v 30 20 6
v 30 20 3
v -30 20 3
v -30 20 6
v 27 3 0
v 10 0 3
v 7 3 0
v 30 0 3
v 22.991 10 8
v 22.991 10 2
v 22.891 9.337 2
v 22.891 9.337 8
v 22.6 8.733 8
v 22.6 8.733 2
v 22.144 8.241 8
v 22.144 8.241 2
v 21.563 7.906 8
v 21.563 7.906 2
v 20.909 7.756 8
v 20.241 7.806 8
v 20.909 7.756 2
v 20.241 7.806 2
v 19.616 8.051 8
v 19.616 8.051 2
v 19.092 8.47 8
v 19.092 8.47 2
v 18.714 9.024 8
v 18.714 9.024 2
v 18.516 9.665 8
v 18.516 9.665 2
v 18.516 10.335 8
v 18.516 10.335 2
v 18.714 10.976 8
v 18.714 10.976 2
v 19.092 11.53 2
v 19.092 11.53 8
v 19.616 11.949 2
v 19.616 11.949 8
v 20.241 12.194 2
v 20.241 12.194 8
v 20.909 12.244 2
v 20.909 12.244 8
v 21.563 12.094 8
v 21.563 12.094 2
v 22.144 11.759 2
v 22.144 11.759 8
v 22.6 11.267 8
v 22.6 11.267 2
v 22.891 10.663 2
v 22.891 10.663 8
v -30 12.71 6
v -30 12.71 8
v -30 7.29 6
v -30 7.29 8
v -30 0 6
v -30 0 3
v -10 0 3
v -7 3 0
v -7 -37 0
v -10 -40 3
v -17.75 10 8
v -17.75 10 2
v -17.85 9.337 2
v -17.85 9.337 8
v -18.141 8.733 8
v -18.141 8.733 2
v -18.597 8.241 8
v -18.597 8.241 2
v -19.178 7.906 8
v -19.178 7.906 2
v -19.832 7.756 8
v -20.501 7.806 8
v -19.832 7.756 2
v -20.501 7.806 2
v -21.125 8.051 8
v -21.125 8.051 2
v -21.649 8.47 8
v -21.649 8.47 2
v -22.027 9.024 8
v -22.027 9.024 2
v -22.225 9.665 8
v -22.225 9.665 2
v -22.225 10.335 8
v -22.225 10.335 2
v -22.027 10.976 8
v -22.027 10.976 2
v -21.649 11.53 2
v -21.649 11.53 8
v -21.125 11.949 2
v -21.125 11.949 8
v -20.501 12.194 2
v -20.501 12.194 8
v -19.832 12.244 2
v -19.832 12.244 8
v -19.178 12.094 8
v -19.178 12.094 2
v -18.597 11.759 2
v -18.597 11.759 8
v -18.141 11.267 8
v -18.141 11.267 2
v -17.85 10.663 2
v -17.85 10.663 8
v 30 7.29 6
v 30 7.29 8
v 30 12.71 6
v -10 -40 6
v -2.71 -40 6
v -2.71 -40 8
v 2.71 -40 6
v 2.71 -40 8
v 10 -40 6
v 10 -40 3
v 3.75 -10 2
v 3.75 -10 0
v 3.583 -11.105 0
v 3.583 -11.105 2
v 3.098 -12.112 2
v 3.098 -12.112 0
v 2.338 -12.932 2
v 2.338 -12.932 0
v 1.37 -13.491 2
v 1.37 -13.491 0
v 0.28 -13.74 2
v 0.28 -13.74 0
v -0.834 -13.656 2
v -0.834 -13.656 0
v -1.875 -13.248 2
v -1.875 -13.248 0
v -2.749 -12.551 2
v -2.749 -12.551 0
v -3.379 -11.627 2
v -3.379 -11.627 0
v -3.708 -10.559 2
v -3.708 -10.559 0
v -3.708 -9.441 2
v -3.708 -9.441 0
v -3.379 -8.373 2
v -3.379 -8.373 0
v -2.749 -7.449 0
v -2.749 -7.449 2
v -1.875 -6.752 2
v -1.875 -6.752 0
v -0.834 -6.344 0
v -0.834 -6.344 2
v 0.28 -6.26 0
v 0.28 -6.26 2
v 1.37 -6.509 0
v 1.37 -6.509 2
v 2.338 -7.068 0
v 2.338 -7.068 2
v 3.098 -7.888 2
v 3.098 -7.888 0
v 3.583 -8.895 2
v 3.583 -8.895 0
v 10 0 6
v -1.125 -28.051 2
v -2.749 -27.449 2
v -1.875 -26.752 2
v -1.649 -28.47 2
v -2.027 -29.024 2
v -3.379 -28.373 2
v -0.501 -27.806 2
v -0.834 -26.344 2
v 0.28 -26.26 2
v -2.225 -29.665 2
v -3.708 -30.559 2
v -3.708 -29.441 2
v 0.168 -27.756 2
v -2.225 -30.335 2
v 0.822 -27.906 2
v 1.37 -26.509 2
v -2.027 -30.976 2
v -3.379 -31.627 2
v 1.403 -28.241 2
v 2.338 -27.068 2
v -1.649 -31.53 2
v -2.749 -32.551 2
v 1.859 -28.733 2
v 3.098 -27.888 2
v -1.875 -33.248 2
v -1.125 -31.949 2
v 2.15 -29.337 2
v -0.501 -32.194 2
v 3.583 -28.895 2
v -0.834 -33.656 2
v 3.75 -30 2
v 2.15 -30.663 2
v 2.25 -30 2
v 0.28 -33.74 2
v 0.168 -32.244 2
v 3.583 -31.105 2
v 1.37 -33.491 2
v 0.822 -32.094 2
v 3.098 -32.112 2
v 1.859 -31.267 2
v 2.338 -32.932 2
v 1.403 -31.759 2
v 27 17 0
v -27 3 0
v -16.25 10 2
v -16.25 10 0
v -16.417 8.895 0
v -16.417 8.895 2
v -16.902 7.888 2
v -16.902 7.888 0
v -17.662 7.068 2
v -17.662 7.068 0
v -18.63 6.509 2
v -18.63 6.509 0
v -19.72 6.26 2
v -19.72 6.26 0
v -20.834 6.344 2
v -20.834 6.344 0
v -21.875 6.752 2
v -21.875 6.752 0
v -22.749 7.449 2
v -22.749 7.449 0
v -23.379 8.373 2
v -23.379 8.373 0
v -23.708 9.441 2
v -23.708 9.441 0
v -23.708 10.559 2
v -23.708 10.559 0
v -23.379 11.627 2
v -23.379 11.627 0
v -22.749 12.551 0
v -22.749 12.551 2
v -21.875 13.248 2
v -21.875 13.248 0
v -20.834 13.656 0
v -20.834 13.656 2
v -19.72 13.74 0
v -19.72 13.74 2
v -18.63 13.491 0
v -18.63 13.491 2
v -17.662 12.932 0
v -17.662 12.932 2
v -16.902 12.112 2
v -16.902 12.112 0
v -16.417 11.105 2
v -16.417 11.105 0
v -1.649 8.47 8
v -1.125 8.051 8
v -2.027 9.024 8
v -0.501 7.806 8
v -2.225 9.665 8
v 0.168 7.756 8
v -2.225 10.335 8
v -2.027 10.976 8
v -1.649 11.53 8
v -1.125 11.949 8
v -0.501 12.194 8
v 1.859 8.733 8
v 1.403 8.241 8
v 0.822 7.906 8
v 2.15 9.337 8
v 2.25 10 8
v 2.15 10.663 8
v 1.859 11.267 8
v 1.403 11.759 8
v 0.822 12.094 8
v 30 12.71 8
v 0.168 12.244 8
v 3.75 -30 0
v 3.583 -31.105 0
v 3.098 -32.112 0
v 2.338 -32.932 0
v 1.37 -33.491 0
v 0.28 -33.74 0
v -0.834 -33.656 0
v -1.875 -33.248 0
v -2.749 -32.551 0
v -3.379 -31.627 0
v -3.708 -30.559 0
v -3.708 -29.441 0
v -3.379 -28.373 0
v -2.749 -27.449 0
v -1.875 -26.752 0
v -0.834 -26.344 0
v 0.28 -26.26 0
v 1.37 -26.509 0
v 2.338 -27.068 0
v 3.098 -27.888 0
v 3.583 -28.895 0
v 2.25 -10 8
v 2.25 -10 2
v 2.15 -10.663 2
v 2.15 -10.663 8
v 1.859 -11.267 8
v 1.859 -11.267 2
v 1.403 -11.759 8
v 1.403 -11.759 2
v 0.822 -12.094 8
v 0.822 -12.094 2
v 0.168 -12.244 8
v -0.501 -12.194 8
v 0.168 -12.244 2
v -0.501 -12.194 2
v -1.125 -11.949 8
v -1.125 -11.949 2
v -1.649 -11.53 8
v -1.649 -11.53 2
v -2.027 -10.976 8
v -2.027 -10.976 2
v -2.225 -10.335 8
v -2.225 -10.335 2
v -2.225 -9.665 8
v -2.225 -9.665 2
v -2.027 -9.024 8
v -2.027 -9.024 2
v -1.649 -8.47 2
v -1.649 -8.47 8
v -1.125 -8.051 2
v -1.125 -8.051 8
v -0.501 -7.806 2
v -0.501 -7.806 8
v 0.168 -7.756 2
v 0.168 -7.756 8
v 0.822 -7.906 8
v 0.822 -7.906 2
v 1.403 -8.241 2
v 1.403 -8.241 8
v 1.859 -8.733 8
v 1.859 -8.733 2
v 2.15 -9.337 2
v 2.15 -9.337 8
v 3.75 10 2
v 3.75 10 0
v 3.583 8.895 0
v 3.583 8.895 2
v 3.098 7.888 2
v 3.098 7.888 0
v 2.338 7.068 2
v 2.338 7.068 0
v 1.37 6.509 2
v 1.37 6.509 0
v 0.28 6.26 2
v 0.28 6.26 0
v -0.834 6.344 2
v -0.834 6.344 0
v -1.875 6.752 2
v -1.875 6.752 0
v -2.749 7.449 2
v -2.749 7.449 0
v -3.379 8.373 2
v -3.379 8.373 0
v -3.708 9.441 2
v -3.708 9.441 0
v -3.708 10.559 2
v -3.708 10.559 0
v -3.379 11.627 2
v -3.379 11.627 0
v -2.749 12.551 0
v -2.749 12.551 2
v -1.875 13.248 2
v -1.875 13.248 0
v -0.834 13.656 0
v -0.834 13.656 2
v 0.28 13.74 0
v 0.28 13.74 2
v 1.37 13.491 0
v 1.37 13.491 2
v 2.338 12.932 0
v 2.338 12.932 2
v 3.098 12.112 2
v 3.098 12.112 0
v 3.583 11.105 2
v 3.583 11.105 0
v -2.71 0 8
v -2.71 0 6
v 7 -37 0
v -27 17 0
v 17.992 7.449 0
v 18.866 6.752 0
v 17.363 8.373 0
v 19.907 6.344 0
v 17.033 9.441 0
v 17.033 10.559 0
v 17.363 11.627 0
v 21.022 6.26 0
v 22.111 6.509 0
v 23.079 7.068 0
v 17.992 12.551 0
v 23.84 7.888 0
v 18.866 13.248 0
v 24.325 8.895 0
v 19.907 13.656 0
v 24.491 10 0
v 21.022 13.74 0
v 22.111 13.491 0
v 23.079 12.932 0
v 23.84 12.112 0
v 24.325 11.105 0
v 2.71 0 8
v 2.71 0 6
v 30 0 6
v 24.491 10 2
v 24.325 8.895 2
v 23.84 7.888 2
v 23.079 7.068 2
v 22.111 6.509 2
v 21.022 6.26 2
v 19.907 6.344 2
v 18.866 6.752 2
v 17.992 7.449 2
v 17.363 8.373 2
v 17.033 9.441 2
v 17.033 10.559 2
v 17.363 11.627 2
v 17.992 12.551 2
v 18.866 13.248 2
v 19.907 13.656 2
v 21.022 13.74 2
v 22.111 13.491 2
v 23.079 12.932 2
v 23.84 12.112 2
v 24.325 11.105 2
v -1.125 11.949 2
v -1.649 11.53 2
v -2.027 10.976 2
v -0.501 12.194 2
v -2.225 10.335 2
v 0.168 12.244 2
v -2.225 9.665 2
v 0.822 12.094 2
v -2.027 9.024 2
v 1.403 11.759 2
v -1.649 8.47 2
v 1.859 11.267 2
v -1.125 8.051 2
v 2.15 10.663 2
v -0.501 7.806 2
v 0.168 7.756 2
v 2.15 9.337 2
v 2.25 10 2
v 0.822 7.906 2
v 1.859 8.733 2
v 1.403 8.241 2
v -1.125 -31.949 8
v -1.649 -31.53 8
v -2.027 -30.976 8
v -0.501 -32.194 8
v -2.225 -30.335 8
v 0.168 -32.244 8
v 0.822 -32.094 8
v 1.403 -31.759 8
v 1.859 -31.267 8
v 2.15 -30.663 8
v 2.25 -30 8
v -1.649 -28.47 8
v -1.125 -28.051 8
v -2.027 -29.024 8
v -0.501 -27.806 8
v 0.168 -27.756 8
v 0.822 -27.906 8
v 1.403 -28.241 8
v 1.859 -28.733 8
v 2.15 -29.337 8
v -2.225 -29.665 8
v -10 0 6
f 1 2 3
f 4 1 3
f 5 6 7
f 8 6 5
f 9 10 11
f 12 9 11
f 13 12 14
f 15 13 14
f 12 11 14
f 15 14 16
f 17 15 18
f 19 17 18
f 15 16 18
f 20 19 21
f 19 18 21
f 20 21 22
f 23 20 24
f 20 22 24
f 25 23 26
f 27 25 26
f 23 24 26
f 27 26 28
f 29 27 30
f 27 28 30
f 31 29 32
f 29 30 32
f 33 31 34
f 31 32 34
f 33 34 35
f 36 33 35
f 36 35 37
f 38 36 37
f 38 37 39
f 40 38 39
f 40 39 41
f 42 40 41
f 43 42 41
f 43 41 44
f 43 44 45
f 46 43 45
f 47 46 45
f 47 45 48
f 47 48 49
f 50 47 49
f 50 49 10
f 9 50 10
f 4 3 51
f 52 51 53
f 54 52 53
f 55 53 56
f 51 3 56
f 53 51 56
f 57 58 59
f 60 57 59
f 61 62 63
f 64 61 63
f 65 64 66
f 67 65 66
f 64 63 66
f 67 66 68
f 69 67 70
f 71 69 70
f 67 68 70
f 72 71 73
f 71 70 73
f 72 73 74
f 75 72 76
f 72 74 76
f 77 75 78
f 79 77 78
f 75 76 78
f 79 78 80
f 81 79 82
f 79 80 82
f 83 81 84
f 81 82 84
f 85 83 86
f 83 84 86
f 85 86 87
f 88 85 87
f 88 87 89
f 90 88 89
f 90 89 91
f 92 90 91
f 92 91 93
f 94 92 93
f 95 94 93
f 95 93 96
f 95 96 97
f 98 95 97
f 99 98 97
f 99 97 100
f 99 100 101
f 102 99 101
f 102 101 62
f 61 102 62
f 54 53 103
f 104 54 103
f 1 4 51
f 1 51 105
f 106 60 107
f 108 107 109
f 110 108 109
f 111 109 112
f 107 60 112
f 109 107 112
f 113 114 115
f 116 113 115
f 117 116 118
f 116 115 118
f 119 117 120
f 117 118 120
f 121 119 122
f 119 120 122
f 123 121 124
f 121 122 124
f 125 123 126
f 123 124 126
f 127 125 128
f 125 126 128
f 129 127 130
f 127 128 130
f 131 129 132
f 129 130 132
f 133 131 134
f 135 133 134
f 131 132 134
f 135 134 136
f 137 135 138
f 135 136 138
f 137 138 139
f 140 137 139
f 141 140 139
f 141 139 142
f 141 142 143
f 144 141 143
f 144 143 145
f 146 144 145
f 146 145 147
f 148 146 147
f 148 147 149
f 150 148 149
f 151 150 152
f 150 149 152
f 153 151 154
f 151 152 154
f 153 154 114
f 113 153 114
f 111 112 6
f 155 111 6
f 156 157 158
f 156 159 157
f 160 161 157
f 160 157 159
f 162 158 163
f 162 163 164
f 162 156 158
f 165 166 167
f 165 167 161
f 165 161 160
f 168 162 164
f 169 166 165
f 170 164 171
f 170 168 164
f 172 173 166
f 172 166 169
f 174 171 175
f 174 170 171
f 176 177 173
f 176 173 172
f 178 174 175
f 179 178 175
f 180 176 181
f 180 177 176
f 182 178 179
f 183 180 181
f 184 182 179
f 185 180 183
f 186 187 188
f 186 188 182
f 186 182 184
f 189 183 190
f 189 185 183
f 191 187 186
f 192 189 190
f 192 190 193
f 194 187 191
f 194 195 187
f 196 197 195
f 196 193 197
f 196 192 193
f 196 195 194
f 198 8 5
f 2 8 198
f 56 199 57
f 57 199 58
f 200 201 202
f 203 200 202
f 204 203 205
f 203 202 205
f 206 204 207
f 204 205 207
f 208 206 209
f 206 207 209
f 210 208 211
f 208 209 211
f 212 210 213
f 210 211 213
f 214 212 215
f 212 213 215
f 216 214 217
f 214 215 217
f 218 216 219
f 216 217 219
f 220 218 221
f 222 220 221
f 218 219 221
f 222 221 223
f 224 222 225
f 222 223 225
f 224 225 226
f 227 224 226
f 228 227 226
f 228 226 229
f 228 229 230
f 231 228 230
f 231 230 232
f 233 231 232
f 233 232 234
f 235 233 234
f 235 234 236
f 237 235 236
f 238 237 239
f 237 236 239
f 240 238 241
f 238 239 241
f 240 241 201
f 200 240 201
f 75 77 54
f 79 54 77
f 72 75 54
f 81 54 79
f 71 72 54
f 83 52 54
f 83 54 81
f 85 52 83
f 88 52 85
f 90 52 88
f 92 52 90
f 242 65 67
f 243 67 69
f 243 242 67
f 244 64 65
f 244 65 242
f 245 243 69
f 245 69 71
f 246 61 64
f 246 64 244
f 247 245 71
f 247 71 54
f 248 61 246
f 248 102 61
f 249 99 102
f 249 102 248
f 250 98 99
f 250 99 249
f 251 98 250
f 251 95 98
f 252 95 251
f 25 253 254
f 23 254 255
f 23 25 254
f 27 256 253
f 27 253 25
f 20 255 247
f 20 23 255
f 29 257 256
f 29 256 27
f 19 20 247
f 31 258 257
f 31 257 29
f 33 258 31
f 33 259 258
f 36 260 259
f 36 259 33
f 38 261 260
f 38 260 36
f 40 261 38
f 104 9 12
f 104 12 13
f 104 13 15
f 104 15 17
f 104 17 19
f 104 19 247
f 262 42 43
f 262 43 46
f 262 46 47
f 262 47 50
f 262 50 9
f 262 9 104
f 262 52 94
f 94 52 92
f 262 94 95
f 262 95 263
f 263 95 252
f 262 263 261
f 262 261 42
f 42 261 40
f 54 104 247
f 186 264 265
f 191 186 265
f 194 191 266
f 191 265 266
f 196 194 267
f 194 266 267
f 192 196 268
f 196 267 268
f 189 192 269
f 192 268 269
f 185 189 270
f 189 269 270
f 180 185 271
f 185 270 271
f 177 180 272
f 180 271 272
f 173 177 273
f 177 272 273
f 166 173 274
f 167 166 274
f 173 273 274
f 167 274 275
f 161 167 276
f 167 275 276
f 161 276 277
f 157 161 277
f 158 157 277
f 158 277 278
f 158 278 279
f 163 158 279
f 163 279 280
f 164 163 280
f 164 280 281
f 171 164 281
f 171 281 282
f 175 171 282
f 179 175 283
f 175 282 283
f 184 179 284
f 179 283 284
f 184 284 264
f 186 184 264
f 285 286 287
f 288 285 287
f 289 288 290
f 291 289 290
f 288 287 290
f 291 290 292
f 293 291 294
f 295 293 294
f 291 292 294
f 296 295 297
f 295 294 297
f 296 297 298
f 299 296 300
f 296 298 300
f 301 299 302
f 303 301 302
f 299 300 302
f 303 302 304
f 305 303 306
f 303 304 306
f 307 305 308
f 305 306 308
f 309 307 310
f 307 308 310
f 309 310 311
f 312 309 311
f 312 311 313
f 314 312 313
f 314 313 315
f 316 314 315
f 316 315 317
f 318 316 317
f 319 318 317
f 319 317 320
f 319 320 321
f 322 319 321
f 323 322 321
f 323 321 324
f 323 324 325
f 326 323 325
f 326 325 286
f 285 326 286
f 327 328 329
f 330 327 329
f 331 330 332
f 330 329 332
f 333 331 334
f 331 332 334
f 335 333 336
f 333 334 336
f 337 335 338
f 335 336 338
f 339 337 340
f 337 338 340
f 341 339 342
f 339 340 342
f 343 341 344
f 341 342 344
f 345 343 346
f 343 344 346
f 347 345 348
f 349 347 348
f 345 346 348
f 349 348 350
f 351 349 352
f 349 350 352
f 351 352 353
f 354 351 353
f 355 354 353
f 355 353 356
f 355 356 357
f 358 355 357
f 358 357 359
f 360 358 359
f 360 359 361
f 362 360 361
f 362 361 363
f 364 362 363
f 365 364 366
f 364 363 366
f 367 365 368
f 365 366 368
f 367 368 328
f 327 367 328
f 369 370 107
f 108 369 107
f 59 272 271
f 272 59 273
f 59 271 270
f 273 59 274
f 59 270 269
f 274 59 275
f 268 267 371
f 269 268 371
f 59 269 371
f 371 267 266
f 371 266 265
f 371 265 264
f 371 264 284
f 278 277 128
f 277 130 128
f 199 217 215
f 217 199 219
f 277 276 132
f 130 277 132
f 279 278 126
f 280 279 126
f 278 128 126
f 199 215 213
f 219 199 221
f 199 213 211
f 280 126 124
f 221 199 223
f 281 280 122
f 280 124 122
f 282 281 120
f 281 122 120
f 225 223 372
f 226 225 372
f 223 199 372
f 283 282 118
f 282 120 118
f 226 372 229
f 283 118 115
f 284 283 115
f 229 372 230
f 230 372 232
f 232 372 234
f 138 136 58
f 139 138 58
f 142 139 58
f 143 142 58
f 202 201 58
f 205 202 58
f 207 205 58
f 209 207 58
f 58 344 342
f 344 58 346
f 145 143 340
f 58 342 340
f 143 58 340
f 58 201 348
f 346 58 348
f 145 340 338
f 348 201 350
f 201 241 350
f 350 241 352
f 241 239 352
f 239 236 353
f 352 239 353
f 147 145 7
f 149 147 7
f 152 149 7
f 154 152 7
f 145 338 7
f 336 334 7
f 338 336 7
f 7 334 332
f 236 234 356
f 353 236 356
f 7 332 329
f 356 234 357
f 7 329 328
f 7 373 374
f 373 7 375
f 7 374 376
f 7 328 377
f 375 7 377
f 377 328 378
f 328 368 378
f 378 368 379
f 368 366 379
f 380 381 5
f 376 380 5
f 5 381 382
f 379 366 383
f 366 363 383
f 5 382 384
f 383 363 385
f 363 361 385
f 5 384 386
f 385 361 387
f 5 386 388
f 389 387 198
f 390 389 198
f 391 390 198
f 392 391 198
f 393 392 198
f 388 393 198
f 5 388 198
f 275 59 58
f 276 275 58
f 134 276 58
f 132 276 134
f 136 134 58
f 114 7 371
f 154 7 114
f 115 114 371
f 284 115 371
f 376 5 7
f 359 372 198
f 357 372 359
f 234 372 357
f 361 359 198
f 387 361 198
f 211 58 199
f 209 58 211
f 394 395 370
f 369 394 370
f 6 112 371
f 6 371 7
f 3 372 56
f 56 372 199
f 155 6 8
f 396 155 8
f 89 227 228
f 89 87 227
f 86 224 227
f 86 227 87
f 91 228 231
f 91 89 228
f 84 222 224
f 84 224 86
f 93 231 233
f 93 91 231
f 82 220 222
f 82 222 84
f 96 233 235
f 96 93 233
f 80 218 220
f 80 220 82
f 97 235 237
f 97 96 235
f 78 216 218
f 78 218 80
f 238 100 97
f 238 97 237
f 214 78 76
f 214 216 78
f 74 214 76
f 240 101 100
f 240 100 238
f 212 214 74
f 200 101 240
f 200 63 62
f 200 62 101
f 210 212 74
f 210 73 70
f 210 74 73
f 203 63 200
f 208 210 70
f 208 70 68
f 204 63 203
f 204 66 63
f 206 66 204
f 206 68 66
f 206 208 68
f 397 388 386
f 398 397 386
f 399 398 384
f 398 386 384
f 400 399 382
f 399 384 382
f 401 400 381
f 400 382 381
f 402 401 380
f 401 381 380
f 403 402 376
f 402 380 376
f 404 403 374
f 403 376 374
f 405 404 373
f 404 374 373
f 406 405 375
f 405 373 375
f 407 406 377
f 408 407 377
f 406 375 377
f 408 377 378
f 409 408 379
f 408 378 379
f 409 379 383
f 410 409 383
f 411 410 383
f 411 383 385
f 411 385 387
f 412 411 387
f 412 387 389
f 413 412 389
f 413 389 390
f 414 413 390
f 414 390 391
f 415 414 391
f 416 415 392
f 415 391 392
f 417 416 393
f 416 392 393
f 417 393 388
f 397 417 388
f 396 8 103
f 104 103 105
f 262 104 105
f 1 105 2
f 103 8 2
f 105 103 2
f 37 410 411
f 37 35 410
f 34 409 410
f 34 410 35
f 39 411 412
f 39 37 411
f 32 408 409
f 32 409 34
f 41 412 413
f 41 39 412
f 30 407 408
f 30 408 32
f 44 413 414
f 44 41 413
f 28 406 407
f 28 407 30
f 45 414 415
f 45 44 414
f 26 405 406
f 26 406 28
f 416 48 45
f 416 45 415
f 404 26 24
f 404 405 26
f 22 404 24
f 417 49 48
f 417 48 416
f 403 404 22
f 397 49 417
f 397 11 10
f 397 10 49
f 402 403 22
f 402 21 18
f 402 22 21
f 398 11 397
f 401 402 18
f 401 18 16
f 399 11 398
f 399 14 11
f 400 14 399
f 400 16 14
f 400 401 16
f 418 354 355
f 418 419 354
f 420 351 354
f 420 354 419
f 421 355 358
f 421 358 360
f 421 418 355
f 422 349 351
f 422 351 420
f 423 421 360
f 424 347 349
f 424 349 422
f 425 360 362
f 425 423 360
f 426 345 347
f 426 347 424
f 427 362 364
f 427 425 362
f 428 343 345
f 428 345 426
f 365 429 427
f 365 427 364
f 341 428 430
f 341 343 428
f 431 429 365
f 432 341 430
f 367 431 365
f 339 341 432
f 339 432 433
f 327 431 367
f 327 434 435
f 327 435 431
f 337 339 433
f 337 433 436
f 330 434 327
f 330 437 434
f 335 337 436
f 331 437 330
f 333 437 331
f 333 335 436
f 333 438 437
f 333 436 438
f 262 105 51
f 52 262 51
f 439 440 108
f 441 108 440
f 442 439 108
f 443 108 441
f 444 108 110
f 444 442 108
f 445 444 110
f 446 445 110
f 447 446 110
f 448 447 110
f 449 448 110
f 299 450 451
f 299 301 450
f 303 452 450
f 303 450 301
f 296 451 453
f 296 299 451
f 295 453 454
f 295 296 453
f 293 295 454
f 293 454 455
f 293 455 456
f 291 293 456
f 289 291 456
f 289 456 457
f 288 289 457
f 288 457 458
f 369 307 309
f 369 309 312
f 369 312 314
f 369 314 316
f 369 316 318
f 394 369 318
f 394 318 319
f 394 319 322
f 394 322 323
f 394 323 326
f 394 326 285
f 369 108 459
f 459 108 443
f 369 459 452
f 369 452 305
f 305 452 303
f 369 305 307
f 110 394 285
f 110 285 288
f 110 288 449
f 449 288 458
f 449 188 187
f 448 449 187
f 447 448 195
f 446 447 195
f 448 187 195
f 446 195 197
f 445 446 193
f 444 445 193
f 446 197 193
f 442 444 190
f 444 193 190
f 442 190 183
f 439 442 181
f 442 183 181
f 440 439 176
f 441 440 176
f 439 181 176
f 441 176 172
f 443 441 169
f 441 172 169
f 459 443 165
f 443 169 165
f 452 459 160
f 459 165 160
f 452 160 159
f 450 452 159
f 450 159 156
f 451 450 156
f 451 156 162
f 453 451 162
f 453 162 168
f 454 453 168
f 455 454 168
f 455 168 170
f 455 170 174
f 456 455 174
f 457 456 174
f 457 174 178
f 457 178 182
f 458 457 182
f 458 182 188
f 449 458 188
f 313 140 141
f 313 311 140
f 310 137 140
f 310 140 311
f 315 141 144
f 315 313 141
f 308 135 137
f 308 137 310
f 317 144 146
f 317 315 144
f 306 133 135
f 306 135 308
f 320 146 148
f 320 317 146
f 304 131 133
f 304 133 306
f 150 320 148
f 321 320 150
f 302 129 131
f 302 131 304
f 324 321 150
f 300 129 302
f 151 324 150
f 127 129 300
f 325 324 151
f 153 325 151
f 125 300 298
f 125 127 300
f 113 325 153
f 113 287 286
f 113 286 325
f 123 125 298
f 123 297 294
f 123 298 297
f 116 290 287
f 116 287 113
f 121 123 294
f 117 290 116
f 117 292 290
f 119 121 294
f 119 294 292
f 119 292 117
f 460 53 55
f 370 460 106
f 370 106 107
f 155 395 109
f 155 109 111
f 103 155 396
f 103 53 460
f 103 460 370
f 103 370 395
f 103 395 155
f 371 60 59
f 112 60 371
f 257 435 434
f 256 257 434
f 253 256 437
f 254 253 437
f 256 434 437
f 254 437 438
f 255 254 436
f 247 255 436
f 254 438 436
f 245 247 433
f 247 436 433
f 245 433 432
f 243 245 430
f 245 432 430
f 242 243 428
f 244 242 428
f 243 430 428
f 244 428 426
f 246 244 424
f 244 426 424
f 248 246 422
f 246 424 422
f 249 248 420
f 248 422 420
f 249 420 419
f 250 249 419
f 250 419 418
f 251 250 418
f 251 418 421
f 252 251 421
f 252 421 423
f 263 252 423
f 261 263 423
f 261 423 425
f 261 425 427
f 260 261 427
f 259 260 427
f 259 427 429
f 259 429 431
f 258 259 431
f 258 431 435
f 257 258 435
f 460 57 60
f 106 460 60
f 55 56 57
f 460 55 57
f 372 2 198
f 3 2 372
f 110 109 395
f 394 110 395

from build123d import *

# Parameters (mm, degrees)
F1_DEPTH = 6
F3_DEPTH = 2
F4_R     = 2.25
F5_DEPTH = 8.001
F6_R     = 3.75
F7_DEPTH = 2
F8_SIZE  = 3


with BuildPart() as f1:
    # F0 (on Top) → F1 (new body)
    with BuildSketch(Plane.XY):
        Polygon((-30, 0), (-10, 0), (-10, -40), (0, -40), (10, -40), (10, 0), (30, 0), (30, 20), (0, 20), (-30, 20), align=None)
    extrude(amount=F1_DEPTH)

    # F2 (on face) → F3 (join)
    with BuildSketch(Plane.XY.offset(6)):
        Polygon((2.71, 0), (0, 0), (-2.71, 0), (-2.71, -40), (2.71, -40), align=None)
        Polygon((30, 7.29), (30, 12.71), (-30, 12.71), (-30, 10), (-30, 7.29), align=None)
    extrude(amount=F3_DEPTH)

    # F4 (on face) → F5 (cut, through all)
    with BuildSketch(Plane(origin=(0, 0, 0), x_dir=(1, 0, 0), z_dir=(0, 0, -1))):
        with Locations((-20, -10)):
            Circle(F4_R)
        with Locations((0, 10)):
            Circle(F4_R)
        with Locations((0, 30)):
            Circle(F4_R)
        with Locations((20.741304, -10)):
            Circle(F4_R)
        with Locations((0, -10)):
            Circle(F4_R)
    extrude(amount=-F5_DEPTH, mode=Mode.SUBTRACT)

    # F6 (on face) → F7 (cut)
    with BuildSketch(Plane(origin=(0, 0, 0), x_dir=(1, 0, 0), z_dir=(0, 0, -1))):
        with Locations((0, 30)):
            Circle(F6_R)
        with Locations((0, 10)):
            Circle(F6_R)
        with Locations((20.741304, -10)):
            Circle(F6_R)
        with Locations((-20, -10)):
            Circle(F6_R)
        with Locations((0, -10)):
            Circle(F6_R)
    extrude(amount=-F7_DEPTH, mode=Mode.SUBTRACT)

    # F8
    f8_edges = [f1.edges().sort_by_distance(p)[0] for p in [
        (-10, -20, 0),
        (-20, 0, 0),
        (10, -20, 0),
        (20, 0, 0),
        (0, 20, 0),
        (30, 10, 0),
        (-30, 10, 0),
        (0, -40, 0),
    ]]
    chamfer(f8_edges, length=F8_SIZE)


solid = f1.part
